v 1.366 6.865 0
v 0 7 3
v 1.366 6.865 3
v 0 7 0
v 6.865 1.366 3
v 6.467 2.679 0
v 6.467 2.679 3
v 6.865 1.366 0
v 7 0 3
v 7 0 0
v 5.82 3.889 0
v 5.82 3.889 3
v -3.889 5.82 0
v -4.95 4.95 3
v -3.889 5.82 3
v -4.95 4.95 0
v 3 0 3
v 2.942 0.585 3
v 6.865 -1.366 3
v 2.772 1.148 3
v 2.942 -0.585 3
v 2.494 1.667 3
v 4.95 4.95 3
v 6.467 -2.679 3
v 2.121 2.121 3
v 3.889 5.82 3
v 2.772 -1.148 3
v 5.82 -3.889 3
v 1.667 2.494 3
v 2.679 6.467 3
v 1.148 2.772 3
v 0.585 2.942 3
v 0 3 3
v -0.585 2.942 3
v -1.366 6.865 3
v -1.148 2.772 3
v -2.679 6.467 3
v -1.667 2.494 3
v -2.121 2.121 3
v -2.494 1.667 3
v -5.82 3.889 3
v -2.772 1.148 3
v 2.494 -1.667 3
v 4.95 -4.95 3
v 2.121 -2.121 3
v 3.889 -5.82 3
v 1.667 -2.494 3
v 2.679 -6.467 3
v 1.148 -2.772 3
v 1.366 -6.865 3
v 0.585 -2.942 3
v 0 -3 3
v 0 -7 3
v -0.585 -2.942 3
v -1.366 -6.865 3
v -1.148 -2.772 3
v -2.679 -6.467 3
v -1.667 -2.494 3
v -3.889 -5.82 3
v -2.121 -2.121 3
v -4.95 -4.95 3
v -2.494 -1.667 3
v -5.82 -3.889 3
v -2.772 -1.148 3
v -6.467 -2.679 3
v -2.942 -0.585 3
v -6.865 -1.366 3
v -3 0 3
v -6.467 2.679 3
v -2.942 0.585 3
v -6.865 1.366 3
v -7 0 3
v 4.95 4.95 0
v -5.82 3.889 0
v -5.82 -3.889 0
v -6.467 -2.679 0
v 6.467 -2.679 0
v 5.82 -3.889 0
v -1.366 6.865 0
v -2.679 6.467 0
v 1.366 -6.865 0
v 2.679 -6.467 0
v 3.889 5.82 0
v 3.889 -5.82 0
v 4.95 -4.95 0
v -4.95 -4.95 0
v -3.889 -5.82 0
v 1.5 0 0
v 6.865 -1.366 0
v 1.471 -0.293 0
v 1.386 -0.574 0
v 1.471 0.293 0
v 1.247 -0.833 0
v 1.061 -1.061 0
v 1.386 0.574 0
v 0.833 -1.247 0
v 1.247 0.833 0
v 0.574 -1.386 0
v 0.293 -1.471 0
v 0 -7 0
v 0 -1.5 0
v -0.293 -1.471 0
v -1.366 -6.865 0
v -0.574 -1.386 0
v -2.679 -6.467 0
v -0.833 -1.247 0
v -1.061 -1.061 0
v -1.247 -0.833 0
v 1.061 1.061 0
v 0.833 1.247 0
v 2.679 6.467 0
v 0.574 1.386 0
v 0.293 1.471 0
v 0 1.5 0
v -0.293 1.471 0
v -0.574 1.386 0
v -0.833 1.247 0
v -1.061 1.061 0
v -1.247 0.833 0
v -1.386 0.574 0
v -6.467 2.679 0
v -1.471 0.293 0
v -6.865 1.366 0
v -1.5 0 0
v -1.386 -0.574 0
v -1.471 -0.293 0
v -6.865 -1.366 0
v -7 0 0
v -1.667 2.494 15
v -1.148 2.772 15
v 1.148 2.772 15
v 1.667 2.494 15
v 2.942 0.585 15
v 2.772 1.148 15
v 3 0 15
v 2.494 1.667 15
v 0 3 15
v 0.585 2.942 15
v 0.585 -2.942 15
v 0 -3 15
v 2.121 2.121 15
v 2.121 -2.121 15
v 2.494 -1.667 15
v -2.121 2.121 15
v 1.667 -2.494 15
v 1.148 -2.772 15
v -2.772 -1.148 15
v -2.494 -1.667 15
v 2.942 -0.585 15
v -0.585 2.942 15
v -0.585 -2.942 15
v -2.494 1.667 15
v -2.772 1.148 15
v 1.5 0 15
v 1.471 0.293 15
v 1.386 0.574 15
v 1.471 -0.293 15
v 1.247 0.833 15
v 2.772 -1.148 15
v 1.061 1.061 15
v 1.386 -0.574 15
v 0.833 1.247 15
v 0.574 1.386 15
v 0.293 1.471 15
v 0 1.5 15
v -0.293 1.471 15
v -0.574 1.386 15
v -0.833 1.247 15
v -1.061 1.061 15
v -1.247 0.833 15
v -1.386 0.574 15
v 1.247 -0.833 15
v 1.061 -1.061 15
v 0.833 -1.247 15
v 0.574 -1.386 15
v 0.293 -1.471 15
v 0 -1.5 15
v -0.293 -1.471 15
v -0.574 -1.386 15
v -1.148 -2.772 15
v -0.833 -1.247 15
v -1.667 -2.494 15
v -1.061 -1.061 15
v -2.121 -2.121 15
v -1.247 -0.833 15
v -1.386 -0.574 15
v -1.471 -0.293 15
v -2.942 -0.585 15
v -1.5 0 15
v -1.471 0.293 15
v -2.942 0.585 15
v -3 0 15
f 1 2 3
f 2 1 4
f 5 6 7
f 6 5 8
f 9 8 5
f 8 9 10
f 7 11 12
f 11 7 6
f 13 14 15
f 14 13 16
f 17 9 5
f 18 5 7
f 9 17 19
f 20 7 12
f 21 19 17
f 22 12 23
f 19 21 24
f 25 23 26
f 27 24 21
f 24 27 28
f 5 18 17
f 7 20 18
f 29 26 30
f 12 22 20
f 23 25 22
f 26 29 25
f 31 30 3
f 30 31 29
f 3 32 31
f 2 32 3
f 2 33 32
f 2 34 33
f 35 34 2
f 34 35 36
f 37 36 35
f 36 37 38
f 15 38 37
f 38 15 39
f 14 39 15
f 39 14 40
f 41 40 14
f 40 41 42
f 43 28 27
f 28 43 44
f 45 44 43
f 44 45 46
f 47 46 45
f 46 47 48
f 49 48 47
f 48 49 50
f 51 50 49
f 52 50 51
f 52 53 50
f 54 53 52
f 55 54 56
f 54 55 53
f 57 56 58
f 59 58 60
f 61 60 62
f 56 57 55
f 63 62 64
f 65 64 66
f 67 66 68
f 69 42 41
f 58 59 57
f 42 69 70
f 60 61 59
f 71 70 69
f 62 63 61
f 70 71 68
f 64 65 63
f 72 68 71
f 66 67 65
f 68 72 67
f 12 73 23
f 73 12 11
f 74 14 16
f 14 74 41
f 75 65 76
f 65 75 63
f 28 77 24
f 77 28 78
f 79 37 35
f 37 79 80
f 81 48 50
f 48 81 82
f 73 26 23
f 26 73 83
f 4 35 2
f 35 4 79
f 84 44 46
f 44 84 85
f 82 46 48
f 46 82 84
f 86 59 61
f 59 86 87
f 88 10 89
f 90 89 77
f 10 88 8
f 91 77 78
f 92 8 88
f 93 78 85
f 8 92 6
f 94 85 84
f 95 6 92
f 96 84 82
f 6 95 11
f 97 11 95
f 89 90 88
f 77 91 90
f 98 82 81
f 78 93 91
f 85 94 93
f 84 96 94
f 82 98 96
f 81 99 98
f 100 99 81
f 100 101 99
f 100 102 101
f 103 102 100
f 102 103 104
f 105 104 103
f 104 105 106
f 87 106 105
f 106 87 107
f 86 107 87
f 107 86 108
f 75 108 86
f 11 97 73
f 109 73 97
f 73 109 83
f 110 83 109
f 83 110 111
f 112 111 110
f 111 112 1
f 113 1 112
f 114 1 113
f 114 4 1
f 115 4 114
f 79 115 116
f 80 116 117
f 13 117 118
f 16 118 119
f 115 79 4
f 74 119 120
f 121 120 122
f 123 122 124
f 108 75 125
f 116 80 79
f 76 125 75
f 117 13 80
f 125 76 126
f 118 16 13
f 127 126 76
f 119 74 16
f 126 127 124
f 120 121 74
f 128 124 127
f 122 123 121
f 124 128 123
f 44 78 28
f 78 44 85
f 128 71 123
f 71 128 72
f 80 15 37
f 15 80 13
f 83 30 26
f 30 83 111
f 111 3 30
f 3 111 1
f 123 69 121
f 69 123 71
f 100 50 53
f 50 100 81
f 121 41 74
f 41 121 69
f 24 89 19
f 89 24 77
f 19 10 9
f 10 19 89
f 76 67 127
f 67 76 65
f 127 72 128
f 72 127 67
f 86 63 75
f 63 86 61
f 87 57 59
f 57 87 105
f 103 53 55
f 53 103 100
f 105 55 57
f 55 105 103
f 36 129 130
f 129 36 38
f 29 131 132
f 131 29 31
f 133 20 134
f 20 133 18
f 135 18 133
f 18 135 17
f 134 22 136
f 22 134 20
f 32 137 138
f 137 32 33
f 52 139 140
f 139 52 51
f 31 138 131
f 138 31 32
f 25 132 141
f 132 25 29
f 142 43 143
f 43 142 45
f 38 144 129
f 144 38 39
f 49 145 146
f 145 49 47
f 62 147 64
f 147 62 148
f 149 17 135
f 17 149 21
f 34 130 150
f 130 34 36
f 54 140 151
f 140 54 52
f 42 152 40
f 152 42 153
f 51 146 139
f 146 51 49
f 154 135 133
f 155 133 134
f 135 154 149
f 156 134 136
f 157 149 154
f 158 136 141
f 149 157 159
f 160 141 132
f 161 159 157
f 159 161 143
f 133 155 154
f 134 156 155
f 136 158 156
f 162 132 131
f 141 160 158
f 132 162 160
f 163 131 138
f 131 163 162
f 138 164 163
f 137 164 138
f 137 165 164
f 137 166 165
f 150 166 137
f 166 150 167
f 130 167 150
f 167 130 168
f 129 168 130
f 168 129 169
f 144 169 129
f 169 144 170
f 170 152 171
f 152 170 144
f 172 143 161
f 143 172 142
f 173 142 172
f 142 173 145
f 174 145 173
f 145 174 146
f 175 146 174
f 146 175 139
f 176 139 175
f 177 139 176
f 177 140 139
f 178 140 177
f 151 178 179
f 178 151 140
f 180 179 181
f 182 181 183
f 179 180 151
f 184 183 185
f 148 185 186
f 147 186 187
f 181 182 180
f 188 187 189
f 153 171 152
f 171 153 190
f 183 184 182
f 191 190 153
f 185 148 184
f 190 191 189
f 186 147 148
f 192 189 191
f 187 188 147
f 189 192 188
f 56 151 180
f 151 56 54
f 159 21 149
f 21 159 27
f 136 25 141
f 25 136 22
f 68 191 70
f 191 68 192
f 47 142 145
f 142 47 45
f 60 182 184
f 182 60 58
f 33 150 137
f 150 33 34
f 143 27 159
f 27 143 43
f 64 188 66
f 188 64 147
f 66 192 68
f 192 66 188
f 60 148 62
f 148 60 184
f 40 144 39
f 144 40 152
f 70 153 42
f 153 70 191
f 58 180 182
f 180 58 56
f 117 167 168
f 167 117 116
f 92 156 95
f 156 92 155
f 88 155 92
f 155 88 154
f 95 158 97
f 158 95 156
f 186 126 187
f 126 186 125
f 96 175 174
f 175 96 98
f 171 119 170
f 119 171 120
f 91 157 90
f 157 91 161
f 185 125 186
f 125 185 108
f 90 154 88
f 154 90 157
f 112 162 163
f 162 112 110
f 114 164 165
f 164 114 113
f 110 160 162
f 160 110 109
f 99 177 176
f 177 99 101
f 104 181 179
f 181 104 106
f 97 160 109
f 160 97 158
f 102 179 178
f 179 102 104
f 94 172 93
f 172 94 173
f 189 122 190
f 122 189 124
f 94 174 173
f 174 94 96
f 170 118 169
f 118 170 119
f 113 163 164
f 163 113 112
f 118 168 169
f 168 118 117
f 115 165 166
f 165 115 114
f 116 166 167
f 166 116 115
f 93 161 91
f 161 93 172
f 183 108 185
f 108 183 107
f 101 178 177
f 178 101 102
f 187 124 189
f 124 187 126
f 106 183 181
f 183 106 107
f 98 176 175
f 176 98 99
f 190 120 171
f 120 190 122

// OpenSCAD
$fn = 32;

// ----------------------------------------------------------------------
// Micro post: flanged post, 5-20 mm class
// ----------------------------------------------------------------------

// --- parameters (mm) ---
post_d = 6;               // post diameter
post_h = 12;              // post height above the flange
flange_d = 14;            // flange diameter
flange_t = 3;             // flange thickness
bore_d = 3;               // through bore

total_h = post_h + flange_t;  // overall height

difference() {
  union() {
    cylinder(h = flange_t, d = flange_d);
    translate([0, 0, flange_t]) cylinder(h = post_h, d = post_d);
  }
  translate([0, 0, -1]) cylinder(h = total_h + 2, d = bore_d);
}
